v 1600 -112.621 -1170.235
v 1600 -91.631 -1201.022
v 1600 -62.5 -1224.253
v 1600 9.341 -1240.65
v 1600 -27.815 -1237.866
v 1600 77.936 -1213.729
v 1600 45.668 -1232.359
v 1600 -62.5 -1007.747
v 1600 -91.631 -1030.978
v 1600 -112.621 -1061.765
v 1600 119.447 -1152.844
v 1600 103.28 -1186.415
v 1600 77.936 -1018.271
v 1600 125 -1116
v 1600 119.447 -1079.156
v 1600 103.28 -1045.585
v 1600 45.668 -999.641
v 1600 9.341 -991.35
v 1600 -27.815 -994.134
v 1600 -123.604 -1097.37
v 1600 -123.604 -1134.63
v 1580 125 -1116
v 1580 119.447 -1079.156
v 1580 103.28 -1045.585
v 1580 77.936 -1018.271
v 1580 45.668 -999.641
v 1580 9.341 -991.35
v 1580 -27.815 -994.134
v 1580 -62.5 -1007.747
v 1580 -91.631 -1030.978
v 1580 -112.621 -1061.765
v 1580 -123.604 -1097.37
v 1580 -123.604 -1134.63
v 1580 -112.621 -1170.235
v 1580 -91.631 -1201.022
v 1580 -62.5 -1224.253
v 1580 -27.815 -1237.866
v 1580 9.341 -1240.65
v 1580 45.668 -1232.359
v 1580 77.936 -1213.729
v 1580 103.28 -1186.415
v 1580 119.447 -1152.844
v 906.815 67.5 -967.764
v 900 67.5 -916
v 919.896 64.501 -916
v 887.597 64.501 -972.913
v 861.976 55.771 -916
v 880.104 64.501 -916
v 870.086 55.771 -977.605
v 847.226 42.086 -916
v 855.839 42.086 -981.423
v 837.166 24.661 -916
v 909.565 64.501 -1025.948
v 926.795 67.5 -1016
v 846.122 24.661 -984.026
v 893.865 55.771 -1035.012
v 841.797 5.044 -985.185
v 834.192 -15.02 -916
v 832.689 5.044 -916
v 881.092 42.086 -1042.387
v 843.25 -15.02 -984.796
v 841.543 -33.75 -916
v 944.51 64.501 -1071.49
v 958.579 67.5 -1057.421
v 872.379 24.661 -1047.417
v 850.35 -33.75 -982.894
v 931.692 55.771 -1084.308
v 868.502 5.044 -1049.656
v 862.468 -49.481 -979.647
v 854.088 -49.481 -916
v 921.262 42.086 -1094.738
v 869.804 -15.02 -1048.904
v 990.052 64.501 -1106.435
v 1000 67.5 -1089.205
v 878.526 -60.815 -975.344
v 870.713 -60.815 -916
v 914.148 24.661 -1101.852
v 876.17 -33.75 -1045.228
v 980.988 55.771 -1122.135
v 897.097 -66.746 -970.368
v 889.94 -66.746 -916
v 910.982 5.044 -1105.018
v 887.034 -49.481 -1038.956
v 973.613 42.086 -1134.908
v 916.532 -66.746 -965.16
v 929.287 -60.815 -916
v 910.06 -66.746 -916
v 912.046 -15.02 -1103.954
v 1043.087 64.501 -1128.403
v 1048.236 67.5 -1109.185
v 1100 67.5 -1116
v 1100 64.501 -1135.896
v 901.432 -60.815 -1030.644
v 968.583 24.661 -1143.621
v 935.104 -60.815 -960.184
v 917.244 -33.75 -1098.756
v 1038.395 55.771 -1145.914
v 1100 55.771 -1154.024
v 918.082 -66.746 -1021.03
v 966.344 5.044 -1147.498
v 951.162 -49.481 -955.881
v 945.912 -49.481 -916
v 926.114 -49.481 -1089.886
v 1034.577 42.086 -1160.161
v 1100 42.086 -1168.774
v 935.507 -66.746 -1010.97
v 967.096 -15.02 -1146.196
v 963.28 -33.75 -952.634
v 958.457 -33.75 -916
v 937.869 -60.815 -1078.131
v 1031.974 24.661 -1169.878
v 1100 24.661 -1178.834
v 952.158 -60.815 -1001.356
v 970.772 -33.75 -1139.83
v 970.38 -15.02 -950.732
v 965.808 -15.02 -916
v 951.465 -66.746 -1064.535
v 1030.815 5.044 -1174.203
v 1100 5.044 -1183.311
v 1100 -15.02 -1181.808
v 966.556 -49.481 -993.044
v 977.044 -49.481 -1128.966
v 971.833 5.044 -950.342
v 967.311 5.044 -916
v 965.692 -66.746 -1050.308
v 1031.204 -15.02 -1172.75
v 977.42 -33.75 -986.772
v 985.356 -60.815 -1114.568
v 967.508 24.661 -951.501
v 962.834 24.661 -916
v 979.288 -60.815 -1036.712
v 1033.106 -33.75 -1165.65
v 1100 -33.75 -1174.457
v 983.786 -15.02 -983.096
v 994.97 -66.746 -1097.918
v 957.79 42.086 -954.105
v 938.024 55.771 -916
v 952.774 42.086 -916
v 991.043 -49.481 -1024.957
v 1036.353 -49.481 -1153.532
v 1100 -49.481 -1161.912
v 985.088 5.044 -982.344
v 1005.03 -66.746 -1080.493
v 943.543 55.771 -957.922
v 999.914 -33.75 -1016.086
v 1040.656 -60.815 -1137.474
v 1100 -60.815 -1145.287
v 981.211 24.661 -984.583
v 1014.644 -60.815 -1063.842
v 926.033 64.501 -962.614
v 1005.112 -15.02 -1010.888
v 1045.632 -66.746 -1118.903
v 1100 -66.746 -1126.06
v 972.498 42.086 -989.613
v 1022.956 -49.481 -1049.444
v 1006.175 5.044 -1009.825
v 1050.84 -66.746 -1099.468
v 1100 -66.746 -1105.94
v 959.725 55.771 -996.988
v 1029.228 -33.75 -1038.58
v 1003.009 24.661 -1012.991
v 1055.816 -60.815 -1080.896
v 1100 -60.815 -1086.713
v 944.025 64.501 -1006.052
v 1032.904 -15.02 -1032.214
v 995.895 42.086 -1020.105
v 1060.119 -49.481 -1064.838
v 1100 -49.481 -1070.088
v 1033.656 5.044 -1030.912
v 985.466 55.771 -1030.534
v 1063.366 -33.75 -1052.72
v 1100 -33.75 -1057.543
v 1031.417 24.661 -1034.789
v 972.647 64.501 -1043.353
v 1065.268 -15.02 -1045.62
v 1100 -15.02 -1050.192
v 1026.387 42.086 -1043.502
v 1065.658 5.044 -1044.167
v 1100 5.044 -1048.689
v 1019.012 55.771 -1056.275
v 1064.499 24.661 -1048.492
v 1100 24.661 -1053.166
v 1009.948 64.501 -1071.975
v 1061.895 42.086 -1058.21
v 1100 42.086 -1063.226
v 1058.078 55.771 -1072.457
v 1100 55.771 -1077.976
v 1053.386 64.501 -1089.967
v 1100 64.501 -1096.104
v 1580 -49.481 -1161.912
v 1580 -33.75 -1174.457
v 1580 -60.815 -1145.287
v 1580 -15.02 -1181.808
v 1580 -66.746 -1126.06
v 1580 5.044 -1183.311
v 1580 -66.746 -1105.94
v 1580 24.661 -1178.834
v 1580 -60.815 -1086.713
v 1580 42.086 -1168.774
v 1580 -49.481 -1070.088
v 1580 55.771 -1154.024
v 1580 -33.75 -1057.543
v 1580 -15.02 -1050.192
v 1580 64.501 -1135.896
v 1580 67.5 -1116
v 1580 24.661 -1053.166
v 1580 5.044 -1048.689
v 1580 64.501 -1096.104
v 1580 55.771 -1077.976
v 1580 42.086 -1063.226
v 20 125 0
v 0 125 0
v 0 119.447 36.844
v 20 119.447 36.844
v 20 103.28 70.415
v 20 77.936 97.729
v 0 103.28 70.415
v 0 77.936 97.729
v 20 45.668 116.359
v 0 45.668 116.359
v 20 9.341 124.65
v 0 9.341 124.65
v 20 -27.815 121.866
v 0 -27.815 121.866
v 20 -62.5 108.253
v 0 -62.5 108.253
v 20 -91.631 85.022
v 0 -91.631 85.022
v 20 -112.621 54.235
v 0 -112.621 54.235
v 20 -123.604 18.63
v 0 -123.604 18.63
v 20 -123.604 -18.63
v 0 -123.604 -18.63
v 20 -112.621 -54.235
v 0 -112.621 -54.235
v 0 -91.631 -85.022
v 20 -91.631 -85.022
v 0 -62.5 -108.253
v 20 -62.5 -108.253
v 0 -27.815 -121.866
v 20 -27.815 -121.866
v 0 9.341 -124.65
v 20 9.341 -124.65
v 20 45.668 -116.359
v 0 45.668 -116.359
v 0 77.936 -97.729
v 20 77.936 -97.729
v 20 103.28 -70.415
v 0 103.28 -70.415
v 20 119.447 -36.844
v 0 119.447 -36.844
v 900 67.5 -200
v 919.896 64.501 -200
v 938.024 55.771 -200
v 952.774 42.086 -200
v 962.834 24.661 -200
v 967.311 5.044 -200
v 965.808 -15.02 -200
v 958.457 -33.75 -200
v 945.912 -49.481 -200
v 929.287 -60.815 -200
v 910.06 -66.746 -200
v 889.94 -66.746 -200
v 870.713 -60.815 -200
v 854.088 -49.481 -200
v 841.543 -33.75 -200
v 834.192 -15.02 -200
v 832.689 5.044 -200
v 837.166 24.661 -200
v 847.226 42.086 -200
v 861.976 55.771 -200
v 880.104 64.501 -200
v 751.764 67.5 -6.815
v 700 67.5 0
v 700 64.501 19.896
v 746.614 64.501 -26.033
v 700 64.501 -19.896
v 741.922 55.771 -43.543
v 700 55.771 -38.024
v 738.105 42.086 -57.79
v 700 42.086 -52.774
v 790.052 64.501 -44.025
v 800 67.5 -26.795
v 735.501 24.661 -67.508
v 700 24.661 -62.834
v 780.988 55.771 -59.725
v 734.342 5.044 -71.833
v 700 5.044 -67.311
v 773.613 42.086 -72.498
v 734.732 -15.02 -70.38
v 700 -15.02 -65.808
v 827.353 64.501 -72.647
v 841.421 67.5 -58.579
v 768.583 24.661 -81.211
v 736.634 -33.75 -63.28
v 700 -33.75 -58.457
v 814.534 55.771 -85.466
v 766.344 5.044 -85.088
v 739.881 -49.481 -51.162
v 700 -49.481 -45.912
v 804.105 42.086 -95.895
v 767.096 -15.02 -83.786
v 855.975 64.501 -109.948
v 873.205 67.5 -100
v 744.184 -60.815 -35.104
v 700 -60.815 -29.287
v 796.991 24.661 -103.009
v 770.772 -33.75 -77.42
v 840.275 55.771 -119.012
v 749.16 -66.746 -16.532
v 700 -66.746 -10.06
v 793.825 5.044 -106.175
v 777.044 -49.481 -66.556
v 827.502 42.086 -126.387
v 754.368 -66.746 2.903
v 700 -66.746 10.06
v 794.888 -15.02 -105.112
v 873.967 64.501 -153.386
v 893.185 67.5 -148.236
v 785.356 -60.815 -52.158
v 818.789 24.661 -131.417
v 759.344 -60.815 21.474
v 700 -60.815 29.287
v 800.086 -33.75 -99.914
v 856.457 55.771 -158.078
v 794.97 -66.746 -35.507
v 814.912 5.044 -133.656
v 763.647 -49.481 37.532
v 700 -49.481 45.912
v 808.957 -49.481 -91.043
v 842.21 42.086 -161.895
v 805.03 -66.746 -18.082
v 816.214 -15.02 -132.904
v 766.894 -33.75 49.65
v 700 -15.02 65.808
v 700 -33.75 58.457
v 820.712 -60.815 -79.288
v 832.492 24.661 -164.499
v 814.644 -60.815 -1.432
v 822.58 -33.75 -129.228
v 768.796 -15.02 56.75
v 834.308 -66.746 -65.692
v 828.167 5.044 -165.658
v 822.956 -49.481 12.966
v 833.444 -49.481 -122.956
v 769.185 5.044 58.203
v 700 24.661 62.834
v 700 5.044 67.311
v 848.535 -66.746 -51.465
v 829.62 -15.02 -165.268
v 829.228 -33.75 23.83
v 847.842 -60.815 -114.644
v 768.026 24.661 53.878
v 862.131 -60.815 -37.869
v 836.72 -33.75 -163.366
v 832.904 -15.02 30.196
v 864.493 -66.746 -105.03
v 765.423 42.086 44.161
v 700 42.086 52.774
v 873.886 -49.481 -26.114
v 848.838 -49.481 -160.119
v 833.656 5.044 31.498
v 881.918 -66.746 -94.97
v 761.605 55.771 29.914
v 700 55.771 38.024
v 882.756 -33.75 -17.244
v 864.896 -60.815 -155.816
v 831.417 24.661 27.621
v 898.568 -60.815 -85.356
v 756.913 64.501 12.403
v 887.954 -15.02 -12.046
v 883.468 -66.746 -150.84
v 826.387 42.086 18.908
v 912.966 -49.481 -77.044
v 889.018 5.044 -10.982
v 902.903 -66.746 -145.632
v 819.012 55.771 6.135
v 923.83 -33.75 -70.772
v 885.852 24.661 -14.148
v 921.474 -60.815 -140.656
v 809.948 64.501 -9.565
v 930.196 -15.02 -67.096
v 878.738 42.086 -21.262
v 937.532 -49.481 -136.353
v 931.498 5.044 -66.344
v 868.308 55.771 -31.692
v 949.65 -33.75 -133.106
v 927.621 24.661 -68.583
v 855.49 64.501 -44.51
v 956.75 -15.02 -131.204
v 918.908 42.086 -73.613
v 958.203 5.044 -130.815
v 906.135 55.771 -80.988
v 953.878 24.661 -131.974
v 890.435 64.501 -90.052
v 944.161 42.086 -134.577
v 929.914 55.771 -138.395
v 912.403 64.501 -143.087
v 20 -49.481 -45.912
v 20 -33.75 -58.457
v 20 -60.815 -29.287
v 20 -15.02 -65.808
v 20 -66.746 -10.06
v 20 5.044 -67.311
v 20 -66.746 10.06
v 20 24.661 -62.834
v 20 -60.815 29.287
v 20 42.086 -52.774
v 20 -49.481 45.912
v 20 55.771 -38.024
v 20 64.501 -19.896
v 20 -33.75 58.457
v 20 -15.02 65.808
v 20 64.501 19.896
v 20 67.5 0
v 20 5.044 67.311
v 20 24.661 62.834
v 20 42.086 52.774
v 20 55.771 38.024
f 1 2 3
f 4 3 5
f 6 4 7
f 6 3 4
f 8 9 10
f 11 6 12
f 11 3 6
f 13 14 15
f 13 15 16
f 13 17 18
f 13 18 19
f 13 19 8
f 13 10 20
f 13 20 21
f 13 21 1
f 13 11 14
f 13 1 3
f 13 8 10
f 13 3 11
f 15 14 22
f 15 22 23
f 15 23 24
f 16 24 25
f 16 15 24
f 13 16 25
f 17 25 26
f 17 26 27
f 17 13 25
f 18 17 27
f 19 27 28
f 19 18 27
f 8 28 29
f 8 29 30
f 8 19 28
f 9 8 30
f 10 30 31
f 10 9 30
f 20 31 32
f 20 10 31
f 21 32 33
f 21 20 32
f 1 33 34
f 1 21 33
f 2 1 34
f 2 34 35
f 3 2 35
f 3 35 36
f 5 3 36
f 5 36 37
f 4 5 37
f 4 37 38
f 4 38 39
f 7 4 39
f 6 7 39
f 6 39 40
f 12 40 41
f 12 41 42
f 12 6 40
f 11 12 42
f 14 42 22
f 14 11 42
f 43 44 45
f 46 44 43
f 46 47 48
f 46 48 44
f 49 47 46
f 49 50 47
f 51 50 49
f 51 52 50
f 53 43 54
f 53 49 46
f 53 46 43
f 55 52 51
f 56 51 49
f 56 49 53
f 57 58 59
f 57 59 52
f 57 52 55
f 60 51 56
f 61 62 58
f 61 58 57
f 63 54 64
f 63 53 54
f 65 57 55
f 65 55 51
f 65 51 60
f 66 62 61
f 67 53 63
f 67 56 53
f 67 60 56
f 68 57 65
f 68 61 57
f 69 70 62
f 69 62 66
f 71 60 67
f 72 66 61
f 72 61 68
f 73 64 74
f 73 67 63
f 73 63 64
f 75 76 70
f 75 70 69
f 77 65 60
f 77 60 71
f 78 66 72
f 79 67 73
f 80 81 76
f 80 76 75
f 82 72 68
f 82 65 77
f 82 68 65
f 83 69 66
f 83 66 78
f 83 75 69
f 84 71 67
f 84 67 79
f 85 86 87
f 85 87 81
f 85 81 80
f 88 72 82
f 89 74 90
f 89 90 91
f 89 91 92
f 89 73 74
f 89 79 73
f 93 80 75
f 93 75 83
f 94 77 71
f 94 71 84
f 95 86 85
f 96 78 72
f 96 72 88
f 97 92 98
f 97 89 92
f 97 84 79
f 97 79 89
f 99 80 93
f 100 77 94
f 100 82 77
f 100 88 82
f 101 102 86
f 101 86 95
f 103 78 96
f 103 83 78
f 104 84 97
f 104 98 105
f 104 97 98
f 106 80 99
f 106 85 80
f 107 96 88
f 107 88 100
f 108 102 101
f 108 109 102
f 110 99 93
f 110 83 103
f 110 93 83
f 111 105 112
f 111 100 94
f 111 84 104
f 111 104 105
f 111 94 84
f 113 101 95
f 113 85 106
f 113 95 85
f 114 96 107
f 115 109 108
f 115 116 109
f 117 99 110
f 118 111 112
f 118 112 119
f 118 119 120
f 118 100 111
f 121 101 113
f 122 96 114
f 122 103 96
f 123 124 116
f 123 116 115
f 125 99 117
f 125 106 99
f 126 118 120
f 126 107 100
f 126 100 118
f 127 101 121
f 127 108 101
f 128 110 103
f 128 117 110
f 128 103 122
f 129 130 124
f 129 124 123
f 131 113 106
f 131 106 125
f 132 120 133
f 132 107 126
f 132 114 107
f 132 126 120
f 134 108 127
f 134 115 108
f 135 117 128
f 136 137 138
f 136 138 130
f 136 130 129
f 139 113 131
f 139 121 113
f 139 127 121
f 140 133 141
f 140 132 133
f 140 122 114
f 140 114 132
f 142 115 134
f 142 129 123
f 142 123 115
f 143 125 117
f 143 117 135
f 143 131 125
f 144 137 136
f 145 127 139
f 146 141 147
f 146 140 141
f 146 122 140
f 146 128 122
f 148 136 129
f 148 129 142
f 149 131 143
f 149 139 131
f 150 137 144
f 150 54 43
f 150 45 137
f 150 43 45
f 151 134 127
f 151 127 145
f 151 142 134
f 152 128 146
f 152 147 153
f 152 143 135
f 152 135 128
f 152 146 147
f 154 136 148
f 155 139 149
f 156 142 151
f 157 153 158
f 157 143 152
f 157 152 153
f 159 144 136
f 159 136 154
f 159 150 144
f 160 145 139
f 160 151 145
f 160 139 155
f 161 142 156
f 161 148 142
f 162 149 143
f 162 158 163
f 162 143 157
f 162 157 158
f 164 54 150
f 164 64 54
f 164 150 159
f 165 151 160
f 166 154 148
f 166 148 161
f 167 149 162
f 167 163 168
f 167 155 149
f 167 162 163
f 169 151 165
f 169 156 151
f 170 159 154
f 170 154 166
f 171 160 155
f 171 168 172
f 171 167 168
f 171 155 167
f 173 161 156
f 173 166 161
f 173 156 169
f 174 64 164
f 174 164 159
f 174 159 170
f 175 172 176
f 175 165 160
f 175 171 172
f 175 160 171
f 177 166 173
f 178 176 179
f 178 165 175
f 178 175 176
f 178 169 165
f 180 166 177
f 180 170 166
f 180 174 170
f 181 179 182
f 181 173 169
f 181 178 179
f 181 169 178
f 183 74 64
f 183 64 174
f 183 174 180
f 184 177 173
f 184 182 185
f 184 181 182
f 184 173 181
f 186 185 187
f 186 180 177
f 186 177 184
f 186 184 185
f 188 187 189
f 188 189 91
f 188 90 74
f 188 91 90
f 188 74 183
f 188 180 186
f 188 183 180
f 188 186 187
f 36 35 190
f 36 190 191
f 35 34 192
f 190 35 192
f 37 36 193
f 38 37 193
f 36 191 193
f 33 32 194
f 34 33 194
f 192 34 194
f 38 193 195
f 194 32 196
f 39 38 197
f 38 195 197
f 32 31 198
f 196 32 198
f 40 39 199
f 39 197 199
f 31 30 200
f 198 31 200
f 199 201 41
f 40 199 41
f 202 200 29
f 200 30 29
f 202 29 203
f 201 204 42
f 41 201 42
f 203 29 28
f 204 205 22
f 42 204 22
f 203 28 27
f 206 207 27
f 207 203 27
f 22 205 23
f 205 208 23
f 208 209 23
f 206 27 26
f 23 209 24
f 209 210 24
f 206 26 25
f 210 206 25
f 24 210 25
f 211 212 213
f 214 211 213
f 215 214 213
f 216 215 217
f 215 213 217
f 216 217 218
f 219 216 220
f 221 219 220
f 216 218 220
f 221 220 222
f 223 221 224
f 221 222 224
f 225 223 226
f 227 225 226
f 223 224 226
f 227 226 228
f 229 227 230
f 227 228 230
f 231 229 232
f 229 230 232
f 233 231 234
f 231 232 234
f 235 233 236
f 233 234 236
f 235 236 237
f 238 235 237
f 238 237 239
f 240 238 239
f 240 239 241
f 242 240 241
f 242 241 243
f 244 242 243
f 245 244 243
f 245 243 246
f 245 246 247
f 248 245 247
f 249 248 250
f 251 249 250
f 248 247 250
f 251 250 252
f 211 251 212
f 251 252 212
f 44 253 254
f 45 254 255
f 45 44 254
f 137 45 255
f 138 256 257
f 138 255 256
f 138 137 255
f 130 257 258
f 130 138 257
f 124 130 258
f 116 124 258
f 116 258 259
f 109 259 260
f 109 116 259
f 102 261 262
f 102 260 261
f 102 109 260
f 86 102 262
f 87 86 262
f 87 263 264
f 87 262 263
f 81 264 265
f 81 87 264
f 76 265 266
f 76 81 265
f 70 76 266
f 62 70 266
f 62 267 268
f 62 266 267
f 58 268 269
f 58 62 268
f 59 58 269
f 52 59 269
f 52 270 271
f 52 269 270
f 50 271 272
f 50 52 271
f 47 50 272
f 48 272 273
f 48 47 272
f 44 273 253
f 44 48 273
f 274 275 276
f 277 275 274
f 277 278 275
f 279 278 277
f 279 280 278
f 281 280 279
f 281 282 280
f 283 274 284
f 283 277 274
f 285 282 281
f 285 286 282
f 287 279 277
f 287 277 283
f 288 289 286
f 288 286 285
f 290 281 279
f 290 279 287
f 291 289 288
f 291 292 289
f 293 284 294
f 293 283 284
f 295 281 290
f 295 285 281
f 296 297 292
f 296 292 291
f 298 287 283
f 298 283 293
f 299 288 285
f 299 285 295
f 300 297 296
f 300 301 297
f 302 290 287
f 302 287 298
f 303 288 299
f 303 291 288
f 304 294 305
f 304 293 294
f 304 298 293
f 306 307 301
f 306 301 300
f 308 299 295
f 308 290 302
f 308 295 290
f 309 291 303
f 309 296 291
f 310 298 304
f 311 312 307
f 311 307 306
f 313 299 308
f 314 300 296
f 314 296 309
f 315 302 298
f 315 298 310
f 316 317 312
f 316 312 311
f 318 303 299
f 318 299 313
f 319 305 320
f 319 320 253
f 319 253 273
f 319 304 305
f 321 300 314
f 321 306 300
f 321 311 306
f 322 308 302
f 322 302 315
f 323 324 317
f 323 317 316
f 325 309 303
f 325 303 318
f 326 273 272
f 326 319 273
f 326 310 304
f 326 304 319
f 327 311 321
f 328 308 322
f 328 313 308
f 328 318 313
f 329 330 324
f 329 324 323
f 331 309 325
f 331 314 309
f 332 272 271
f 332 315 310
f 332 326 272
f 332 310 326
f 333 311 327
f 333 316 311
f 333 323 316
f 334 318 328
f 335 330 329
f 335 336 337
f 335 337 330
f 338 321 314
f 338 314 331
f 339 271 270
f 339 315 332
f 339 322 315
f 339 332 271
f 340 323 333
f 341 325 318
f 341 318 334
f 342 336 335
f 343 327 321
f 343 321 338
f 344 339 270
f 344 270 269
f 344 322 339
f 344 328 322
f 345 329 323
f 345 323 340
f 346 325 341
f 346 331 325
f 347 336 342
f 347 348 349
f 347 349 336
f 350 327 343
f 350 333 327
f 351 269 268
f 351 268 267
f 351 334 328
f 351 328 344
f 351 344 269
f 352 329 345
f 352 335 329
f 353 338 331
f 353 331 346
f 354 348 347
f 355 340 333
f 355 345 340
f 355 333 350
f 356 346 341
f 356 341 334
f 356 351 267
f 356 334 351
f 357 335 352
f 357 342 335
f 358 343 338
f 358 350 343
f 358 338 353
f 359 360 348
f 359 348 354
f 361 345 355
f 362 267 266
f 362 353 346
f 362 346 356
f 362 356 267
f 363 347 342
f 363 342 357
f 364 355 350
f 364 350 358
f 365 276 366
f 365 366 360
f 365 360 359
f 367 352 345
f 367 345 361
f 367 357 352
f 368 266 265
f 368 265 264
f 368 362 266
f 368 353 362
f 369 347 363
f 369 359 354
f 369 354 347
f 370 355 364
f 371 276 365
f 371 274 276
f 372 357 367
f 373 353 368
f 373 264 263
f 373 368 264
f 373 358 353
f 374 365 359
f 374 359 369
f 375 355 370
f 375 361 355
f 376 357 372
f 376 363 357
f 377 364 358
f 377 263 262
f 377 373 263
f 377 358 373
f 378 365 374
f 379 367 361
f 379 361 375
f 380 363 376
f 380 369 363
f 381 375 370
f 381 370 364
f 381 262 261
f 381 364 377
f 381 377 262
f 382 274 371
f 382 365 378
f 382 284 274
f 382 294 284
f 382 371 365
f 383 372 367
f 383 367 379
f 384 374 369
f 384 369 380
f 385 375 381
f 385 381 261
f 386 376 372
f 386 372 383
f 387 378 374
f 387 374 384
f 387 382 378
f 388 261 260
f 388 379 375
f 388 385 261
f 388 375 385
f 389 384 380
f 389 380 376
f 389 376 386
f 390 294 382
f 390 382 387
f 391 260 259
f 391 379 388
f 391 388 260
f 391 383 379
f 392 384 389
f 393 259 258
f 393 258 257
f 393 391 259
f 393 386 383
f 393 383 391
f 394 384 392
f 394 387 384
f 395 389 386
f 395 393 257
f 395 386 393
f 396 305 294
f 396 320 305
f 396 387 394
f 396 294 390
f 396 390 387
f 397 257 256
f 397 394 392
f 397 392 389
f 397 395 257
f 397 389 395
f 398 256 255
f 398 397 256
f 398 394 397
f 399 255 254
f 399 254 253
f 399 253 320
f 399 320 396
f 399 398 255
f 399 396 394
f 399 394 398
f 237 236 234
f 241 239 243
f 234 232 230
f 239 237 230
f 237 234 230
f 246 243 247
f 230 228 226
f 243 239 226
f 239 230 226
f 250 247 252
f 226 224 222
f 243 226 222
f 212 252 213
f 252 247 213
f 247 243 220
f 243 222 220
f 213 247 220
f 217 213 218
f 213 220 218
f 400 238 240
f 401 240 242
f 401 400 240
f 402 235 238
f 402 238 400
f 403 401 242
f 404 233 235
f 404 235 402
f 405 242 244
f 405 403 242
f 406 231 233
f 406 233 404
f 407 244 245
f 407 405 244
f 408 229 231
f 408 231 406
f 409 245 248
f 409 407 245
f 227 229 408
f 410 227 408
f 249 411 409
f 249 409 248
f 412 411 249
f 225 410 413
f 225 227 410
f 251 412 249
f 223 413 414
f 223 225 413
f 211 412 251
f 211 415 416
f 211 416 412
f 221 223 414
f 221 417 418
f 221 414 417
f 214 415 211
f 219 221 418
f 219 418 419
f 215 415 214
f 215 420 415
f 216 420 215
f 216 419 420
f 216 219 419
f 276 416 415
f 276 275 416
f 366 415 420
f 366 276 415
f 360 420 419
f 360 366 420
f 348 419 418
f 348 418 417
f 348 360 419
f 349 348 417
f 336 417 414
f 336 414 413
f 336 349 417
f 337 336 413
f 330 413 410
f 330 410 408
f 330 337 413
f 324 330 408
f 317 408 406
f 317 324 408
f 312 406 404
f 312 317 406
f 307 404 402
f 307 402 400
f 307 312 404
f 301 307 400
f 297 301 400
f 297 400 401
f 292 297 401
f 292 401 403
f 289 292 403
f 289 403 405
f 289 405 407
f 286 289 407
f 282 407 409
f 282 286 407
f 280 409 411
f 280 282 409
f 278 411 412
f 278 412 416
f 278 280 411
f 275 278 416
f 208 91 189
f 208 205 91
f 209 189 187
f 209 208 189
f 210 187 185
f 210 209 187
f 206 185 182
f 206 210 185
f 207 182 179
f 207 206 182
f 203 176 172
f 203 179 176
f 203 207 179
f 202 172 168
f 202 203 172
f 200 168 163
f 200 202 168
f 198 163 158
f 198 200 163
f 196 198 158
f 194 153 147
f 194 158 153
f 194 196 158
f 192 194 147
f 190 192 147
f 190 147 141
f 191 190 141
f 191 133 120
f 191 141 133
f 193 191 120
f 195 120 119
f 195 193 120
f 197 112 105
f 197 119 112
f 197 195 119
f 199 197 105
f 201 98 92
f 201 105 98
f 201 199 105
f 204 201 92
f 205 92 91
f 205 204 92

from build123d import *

# Parameters (mm, degrees)
F1_R     = 67.5
F1_R_2   = 125
F3_DEPTH = 20
F4_R     = 125
F5_DEPTH = 20


with BuildPart() as f2:
    # F2: sweep along a path in F0
    with BuildLine(Plane.XZ) as f2_path:
        Line((0, 0), (700, 0))
        ThreePointArc((700, 0), (841.421356, -58.578644), (900, -200))
        Line((900, -200), (900, -916))
        ThreePointArc((900, -916), (958.578644, -1057.421356), (1100, -1116))
        Line((1100, -1116), (1600, -1116))
    # F1 (on Right) → F2 (sweep)
    with BuildSketch(Plane.YZ):
        Circle(F1_R)
    sweep(path=f2_path.line)

    # F1 (on Right) → F3 (join)
    with BuildSketch(Plane.YZ):
        Circle(F1_R_2)
        Circle(F1_R, mode=Mode.SUBTRACT)
    extrude(amount=F3_DEPTH)

    # F4 (on face) → F5 (join)
    with BuildSketch(Plane.YZ.offset(1600)):
        with Locations((0, -1116)):
            Circle(F4_R)
    extrude(amount=-F5_DEPTH)


solid = f2.part
